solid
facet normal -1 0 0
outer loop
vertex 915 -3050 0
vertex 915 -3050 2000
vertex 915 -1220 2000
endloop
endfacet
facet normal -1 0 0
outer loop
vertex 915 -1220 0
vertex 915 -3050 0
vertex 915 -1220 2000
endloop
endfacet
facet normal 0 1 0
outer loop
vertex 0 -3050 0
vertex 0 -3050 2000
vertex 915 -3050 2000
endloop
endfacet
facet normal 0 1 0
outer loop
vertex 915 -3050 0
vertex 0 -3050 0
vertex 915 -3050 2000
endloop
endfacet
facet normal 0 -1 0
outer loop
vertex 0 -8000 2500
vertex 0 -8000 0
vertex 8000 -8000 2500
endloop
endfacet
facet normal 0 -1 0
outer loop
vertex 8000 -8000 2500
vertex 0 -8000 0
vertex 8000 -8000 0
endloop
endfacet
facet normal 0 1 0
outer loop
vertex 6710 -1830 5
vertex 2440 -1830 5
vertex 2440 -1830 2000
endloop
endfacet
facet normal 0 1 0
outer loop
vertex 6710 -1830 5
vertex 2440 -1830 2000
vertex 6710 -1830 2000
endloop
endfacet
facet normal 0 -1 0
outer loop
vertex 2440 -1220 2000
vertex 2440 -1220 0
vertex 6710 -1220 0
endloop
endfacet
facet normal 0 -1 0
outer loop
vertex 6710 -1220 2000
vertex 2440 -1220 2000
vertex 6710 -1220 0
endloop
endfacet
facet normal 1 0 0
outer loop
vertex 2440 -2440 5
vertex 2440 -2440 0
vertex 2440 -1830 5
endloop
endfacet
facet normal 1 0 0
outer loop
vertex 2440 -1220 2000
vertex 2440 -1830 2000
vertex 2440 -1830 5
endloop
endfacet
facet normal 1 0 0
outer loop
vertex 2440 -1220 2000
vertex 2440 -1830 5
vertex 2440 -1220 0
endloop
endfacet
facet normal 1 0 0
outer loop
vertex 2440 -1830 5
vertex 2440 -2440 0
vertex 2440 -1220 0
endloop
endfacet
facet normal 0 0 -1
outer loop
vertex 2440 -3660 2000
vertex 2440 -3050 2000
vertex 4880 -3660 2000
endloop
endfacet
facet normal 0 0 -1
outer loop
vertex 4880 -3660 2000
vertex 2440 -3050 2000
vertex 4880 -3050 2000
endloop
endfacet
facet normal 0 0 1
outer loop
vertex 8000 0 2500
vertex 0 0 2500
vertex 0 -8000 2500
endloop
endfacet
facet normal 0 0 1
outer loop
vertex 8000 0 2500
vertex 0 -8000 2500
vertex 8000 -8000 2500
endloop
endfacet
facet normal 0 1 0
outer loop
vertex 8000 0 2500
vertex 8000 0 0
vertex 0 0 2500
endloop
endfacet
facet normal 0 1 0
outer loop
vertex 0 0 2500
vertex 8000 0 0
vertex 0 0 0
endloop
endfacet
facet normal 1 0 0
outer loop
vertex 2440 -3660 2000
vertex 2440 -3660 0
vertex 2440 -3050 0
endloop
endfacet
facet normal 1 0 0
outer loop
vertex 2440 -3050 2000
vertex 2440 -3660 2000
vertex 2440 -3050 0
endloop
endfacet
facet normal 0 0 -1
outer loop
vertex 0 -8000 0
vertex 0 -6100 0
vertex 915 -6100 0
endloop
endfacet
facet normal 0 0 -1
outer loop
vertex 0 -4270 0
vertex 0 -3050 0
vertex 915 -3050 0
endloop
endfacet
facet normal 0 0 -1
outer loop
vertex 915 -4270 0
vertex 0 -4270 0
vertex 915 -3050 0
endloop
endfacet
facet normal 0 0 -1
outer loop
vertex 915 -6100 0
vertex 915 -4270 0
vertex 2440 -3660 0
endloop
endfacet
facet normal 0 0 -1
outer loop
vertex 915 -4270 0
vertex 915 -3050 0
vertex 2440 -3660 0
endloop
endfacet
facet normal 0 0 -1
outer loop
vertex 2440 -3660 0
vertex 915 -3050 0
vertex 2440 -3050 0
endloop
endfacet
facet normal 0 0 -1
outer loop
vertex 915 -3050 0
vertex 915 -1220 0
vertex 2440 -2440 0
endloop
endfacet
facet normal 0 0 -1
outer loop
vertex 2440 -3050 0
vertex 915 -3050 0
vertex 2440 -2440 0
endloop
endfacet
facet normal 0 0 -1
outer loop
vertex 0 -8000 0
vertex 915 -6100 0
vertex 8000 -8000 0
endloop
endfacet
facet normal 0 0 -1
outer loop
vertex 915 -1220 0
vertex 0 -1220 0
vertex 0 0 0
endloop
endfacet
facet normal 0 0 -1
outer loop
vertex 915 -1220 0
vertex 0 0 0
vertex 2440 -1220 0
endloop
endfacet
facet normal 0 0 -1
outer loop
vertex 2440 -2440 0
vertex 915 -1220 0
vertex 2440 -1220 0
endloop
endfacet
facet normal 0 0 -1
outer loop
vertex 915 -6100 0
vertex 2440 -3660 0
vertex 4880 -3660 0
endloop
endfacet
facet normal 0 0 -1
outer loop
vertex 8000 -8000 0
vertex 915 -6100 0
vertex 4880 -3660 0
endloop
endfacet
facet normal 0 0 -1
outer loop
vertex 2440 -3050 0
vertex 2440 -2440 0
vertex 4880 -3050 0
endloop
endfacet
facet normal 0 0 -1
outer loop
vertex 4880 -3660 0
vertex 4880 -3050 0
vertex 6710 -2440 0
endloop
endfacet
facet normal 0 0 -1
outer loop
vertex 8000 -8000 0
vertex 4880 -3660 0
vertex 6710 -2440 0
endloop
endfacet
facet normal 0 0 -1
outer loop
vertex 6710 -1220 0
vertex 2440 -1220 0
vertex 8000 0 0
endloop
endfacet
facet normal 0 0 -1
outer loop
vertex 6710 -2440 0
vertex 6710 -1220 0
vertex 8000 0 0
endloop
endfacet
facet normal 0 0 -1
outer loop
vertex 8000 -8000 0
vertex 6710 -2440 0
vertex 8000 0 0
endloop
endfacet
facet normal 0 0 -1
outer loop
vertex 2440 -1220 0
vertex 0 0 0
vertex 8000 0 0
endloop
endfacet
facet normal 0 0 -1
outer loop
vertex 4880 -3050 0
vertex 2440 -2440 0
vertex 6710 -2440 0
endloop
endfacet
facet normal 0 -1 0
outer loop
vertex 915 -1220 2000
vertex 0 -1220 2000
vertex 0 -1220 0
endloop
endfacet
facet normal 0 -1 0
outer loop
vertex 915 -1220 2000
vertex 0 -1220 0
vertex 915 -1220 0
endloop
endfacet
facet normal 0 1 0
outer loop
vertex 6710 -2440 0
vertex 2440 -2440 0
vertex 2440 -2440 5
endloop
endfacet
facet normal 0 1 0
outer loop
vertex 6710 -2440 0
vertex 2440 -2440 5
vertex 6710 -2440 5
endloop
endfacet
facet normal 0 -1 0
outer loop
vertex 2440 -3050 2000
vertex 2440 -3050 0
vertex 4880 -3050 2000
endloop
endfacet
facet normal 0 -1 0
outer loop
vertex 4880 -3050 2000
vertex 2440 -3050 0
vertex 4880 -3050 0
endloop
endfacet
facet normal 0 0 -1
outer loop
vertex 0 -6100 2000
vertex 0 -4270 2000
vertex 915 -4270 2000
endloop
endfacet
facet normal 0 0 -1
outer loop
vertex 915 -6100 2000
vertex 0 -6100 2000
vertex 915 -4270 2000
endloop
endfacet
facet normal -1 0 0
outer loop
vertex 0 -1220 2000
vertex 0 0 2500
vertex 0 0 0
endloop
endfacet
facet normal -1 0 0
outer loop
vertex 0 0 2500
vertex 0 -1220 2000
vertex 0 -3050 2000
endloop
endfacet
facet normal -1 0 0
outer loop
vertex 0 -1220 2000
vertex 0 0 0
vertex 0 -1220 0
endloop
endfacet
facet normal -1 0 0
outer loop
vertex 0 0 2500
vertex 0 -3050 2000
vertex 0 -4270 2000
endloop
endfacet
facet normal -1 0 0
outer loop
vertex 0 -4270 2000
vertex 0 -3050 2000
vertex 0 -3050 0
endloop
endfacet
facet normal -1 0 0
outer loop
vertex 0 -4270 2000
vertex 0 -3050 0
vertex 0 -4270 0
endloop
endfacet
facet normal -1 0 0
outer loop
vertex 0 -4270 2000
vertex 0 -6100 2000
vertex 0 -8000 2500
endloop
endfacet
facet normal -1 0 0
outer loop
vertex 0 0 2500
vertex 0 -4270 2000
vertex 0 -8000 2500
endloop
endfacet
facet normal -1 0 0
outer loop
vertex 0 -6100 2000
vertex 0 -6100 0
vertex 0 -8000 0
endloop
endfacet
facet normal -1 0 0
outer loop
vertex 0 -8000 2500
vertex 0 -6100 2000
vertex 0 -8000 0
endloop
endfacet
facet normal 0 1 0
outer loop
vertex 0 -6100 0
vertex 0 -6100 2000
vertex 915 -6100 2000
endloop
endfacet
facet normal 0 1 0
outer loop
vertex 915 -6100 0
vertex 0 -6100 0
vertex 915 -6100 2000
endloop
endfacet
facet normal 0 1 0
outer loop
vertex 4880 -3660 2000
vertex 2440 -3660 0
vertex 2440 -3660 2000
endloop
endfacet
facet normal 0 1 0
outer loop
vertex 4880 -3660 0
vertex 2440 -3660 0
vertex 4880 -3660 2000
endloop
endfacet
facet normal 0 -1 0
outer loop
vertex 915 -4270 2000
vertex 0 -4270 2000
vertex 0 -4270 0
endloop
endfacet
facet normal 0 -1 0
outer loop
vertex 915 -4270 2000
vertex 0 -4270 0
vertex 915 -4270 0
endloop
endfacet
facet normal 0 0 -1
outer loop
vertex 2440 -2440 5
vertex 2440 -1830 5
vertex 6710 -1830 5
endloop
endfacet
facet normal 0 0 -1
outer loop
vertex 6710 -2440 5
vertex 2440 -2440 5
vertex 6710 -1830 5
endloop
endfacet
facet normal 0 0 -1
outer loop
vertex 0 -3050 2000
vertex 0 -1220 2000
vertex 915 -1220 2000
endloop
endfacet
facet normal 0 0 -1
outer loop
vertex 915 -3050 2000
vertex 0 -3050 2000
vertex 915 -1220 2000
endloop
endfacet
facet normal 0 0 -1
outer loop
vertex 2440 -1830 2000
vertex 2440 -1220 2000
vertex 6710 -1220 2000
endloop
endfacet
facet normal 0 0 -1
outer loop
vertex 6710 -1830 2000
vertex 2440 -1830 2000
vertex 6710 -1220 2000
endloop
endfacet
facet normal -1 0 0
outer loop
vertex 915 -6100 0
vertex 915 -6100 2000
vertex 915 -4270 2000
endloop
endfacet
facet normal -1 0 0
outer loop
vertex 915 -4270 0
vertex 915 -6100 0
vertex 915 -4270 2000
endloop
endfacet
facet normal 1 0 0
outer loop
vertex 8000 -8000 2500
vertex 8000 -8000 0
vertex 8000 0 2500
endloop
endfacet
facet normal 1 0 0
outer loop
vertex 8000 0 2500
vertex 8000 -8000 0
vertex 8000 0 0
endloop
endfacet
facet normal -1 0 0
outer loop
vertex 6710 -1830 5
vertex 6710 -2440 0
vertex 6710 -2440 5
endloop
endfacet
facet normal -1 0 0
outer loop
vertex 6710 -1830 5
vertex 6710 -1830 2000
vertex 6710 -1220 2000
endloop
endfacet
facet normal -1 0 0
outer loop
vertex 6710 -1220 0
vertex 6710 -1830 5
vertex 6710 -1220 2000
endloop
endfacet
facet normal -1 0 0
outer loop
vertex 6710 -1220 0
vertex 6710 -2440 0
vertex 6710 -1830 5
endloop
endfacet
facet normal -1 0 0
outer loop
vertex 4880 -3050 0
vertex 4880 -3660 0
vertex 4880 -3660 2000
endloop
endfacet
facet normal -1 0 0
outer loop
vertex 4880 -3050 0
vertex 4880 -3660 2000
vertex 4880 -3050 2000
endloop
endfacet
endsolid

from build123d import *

# Parameters (mm, degrees)
F0_W     = 2440
F0_H     = 610
F0_W_2   = 915
F0_H_2   = 1830
F0_W_3   = 4270
F1_DEPTH = 2500
F2_DEPTH = 2000
F3_DEPTH = 5


with BuildPart() as f1:
    # F0 (on Top) → F1 (new body)
    with BuildSketch(Plane.XY):
        Polygon((8000, 0), (0, 0), (0, -1220), (915, -1220), (915, -3050), (0, -3050), (0, -4270), (915, -4270), (915, -6100), (0, -6100), (0, -8000), (8000, -8000), align=None)
        with Locations((3660, -3355)):
            Rectangle(F0_W, F0_H, mode=Mode.SUBTRACT)
        Polygon((2440, -1830), (2440, -1220), (6710, -1220), (6710, -1830), (6710, -2440), (2440, -2440), align=None, mode=Mode.SUBTRACT)
        with Locations((457.5, -5185)):
            Rectangle(F0_W_2, F0_H_2)
        with Locations((457.5, -2135)):
            Rectangle(F0_W_2, F0_H_2)
        with Locations((3660, -3355)):
            Rectangle(F0_W, F0_H)
        with Locations((4575, -2135)):
            Rectangle(F0_W_3, F0_H)
        with Locations((4575, -1525)):
            Rectangle(F0_W_3, F0_H)
    extrude(amount=F1_DEPTH)

    # F0 (on Top) → F2 (cut)
    with BuildSketch(Plane.XY):
        with Locations((457.5, -5185)):
            Rectangle(F0_W_2, F0_H_2)
        with Locations((457.5, -2135)):
            Rectangle(F0_W_2, F0_H_2)
        with Locations((3660, -3355)):
            Rectangle(F0_W, F0_H)
        with Locations((4575, -1525)):
            Rectangle(F0_W_3, F0_H)
    extrude(amount=F2_DEPTH, mode=Mode.SUBTRACT)

    # F0 (on Top) → F3 (cut)
    with BuildSketch(Plane.XY):
        with Locations((4575, -2135)):
            Rectangle(F0_W_3, F0_H)
    extrude(amount=F3_DEPTH, mode=Mode.SUBTRACT)


solid = f1.part
